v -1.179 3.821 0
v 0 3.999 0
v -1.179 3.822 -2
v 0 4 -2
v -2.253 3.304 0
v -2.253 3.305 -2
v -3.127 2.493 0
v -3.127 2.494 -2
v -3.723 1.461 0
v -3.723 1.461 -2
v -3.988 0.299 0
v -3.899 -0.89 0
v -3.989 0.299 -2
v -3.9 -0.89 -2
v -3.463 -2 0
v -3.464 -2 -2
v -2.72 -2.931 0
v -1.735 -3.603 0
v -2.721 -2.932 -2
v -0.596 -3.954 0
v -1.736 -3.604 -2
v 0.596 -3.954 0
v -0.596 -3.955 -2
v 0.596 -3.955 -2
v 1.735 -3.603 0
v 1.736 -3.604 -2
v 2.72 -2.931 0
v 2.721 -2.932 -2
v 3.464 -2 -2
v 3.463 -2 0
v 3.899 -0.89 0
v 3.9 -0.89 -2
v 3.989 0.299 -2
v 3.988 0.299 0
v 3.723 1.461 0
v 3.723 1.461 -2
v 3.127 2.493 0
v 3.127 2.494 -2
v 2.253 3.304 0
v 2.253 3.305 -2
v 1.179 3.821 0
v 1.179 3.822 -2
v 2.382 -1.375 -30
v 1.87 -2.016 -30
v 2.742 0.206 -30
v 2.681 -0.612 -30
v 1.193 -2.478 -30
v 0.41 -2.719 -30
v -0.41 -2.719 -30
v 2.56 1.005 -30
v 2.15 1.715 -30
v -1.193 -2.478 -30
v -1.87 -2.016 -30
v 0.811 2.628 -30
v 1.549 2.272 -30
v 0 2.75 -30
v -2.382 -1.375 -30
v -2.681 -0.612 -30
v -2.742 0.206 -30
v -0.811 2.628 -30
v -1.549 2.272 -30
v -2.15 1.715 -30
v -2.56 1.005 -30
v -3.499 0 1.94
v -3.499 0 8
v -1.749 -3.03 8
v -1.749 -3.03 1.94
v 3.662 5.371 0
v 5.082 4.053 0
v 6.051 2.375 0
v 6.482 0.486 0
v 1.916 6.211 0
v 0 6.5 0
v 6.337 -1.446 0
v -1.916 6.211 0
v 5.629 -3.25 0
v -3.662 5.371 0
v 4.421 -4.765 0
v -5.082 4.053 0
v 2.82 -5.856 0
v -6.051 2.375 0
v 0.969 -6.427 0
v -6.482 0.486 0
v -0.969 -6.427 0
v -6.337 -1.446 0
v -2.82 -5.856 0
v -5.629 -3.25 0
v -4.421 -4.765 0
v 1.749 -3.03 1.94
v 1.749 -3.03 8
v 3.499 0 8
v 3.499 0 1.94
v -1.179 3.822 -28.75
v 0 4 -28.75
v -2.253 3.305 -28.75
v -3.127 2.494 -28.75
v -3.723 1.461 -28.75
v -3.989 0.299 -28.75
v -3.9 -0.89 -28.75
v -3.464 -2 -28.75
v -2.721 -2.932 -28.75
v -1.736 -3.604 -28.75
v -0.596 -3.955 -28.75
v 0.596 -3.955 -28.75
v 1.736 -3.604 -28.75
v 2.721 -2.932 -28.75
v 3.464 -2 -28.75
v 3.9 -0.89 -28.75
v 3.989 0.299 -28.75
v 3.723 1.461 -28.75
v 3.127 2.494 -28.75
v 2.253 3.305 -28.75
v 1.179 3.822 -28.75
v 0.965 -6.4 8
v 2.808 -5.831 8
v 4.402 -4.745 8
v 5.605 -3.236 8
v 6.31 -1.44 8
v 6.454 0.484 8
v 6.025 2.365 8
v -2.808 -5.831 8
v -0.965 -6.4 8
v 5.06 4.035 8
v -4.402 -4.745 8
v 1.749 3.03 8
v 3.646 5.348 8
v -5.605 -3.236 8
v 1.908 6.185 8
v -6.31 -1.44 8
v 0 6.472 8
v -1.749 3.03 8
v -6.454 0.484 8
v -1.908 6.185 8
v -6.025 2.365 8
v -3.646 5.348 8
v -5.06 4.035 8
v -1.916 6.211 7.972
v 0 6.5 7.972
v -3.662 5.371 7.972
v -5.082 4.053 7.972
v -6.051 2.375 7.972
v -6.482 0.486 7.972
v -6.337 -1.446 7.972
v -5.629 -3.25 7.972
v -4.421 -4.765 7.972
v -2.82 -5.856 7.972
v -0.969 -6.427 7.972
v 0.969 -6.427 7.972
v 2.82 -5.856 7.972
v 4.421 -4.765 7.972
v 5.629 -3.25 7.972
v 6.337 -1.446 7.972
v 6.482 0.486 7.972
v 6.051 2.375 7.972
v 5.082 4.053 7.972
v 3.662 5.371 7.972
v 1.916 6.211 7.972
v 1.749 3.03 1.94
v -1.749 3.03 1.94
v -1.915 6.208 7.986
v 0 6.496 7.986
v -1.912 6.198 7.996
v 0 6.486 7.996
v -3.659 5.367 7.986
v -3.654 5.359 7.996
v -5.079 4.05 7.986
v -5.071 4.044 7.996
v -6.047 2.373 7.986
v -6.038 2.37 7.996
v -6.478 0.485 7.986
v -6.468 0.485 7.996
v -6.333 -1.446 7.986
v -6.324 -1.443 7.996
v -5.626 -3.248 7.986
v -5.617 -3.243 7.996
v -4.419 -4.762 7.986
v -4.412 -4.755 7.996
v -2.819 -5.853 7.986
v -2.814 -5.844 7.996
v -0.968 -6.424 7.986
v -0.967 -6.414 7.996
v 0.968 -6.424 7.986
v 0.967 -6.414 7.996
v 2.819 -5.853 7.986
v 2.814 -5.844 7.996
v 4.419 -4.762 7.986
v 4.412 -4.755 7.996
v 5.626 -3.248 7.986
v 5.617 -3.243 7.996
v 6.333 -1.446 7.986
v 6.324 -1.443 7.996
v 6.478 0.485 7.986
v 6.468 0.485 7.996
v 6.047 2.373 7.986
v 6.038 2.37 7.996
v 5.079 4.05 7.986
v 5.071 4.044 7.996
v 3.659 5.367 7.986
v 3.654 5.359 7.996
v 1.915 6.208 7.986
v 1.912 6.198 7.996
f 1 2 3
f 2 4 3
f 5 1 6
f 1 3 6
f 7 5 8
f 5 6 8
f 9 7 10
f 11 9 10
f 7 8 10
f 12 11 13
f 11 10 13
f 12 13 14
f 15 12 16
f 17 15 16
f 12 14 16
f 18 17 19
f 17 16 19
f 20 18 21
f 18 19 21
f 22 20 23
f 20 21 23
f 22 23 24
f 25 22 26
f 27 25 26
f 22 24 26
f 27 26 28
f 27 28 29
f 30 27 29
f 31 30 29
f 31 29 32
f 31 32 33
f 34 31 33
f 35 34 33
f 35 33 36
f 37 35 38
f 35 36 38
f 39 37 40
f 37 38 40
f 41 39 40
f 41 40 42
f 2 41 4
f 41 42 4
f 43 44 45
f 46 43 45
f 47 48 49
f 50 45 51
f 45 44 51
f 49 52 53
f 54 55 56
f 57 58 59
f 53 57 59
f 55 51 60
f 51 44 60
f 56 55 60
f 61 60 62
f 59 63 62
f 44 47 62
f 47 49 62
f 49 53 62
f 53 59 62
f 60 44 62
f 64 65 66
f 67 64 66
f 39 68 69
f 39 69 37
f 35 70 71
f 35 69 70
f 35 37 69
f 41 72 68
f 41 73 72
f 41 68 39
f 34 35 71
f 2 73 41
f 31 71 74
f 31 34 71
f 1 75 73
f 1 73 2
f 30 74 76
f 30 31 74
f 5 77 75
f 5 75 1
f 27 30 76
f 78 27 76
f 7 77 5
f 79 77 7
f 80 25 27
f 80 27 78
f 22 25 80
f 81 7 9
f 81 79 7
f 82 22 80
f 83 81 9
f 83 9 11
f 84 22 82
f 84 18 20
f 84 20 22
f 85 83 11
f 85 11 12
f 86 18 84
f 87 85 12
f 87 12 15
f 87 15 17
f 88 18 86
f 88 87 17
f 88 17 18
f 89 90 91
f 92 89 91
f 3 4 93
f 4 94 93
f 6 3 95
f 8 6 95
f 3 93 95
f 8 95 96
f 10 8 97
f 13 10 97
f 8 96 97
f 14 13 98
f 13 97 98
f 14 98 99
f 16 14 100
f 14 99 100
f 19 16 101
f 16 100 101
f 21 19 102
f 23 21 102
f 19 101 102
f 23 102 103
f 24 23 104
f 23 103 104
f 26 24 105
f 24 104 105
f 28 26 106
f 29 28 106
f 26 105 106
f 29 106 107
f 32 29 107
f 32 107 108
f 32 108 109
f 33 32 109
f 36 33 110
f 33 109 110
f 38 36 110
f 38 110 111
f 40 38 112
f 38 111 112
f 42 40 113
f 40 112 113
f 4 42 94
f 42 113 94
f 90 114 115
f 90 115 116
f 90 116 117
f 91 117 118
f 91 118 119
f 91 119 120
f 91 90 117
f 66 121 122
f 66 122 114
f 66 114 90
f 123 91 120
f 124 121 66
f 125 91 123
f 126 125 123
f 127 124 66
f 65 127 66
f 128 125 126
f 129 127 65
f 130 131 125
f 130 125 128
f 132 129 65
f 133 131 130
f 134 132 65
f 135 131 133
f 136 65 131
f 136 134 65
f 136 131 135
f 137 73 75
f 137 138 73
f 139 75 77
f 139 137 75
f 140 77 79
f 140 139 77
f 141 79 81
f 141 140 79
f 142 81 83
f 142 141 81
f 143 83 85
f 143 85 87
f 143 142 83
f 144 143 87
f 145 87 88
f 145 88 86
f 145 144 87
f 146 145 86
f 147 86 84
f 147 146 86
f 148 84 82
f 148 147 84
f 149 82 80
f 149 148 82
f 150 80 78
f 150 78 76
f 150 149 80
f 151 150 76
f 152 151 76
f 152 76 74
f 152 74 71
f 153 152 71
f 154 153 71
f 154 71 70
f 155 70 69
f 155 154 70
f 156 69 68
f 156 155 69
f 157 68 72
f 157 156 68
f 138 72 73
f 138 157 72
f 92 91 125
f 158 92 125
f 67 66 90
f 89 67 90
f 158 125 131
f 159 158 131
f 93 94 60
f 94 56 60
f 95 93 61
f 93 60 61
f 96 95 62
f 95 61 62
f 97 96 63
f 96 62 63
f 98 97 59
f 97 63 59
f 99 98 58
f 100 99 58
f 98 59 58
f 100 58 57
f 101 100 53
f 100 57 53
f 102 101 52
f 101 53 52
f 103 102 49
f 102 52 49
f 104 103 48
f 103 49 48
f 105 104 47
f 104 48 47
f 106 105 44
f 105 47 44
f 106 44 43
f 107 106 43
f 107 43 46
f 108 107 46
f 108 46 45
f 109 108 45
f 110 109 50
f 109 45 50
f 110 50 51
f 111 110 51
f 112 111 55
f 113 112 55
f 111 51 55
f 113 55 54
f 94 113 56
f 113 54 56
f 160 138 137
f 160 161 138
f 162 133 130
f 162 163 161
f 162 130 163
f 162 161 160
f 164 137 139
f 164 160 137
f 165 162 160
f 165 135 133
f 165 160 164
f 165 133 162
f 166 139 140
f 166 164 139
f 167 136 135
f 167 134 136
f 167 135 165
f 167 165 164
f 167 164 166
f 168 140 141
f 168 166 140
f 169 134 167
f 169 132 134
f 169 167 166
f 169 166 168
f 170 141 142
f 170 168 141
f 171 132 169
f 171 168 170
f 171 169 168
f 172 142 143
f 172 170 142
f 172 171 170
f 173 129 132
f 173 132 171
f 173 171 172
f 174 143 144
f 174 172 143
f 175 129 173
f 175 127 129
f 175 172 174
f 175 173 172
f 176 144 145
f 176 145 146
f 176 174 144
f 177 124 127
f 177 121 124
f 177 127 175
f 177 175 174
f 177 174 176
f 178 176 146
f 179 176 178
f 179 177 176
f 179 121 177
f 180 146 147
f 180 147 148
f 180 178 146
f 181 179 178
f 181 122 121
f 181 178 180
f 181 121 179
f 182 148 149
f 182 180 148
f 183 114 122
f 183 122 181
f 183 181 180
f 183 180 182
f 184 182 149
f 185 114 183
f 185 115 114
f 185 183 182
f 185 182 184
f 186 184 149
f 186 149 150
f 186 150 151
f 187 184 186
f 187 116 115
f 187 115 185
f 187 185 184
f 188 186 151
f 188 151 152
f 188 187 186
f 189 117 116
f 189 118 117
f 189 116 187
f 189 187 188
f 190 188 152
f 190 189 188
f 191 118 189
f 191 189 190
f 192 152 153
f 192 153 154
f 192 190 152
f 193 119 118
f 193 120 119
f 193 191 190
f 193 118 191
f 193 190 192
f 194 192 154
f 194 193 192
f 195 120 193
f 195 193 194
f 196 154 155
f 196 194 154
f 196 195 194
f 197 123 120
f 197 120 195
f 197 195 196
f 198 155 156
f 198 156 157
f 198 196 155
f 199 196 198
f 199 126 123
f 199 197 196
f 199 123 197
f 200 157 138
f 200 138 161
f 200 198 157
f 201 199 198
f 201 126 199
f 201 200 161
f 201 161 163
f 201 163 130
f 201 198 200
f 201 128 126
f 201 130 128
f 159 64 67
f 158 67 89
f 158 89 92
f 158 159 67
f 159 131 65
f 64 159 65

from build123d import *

# Parameters (mm, degrees)
POCKET_DEPTH = 6.06


with BuildPart() as part:
    # Sketch → Revolve (revolve)
    with BuildSketch(Plane.YZ):
        with BuildLine():
            Line((3.999, 0), (6.5, 0))
            Line((6.5, 0), (6.5, 7.97229))
            ThreePointArc((6.5, 7.97229), (6.491884, 7.991884), (6.47229, 8))
            Line((6.47229, 8), (0, 8))
            Line((0, -30), (0, 8))
            Line((2.75, -30), (0, -30))
            Line((4, -28.75), (2.75, -30))
            Line((4, -2), (4, -28.75))
            Line((3.999, 0), (4, -2))
        make_face()
    revolve(axis=Axis((0, 0, 0), (0, 0, 1)))

    # Sketch001 → Pocket (cut)
    with BuildSketch(Plane.XY.offset(8)):
        Polygon((3.498743, 0), (1.749371, 3.03), (-1.749371, 3.03), (-3.498743, 0), (-1.749371, -3.03), (1.749371, -3.03), align=None)
    extrude(amount=-POCKET_DEPTH, mode=Mode.SUBTRACT)


solid = part.part
